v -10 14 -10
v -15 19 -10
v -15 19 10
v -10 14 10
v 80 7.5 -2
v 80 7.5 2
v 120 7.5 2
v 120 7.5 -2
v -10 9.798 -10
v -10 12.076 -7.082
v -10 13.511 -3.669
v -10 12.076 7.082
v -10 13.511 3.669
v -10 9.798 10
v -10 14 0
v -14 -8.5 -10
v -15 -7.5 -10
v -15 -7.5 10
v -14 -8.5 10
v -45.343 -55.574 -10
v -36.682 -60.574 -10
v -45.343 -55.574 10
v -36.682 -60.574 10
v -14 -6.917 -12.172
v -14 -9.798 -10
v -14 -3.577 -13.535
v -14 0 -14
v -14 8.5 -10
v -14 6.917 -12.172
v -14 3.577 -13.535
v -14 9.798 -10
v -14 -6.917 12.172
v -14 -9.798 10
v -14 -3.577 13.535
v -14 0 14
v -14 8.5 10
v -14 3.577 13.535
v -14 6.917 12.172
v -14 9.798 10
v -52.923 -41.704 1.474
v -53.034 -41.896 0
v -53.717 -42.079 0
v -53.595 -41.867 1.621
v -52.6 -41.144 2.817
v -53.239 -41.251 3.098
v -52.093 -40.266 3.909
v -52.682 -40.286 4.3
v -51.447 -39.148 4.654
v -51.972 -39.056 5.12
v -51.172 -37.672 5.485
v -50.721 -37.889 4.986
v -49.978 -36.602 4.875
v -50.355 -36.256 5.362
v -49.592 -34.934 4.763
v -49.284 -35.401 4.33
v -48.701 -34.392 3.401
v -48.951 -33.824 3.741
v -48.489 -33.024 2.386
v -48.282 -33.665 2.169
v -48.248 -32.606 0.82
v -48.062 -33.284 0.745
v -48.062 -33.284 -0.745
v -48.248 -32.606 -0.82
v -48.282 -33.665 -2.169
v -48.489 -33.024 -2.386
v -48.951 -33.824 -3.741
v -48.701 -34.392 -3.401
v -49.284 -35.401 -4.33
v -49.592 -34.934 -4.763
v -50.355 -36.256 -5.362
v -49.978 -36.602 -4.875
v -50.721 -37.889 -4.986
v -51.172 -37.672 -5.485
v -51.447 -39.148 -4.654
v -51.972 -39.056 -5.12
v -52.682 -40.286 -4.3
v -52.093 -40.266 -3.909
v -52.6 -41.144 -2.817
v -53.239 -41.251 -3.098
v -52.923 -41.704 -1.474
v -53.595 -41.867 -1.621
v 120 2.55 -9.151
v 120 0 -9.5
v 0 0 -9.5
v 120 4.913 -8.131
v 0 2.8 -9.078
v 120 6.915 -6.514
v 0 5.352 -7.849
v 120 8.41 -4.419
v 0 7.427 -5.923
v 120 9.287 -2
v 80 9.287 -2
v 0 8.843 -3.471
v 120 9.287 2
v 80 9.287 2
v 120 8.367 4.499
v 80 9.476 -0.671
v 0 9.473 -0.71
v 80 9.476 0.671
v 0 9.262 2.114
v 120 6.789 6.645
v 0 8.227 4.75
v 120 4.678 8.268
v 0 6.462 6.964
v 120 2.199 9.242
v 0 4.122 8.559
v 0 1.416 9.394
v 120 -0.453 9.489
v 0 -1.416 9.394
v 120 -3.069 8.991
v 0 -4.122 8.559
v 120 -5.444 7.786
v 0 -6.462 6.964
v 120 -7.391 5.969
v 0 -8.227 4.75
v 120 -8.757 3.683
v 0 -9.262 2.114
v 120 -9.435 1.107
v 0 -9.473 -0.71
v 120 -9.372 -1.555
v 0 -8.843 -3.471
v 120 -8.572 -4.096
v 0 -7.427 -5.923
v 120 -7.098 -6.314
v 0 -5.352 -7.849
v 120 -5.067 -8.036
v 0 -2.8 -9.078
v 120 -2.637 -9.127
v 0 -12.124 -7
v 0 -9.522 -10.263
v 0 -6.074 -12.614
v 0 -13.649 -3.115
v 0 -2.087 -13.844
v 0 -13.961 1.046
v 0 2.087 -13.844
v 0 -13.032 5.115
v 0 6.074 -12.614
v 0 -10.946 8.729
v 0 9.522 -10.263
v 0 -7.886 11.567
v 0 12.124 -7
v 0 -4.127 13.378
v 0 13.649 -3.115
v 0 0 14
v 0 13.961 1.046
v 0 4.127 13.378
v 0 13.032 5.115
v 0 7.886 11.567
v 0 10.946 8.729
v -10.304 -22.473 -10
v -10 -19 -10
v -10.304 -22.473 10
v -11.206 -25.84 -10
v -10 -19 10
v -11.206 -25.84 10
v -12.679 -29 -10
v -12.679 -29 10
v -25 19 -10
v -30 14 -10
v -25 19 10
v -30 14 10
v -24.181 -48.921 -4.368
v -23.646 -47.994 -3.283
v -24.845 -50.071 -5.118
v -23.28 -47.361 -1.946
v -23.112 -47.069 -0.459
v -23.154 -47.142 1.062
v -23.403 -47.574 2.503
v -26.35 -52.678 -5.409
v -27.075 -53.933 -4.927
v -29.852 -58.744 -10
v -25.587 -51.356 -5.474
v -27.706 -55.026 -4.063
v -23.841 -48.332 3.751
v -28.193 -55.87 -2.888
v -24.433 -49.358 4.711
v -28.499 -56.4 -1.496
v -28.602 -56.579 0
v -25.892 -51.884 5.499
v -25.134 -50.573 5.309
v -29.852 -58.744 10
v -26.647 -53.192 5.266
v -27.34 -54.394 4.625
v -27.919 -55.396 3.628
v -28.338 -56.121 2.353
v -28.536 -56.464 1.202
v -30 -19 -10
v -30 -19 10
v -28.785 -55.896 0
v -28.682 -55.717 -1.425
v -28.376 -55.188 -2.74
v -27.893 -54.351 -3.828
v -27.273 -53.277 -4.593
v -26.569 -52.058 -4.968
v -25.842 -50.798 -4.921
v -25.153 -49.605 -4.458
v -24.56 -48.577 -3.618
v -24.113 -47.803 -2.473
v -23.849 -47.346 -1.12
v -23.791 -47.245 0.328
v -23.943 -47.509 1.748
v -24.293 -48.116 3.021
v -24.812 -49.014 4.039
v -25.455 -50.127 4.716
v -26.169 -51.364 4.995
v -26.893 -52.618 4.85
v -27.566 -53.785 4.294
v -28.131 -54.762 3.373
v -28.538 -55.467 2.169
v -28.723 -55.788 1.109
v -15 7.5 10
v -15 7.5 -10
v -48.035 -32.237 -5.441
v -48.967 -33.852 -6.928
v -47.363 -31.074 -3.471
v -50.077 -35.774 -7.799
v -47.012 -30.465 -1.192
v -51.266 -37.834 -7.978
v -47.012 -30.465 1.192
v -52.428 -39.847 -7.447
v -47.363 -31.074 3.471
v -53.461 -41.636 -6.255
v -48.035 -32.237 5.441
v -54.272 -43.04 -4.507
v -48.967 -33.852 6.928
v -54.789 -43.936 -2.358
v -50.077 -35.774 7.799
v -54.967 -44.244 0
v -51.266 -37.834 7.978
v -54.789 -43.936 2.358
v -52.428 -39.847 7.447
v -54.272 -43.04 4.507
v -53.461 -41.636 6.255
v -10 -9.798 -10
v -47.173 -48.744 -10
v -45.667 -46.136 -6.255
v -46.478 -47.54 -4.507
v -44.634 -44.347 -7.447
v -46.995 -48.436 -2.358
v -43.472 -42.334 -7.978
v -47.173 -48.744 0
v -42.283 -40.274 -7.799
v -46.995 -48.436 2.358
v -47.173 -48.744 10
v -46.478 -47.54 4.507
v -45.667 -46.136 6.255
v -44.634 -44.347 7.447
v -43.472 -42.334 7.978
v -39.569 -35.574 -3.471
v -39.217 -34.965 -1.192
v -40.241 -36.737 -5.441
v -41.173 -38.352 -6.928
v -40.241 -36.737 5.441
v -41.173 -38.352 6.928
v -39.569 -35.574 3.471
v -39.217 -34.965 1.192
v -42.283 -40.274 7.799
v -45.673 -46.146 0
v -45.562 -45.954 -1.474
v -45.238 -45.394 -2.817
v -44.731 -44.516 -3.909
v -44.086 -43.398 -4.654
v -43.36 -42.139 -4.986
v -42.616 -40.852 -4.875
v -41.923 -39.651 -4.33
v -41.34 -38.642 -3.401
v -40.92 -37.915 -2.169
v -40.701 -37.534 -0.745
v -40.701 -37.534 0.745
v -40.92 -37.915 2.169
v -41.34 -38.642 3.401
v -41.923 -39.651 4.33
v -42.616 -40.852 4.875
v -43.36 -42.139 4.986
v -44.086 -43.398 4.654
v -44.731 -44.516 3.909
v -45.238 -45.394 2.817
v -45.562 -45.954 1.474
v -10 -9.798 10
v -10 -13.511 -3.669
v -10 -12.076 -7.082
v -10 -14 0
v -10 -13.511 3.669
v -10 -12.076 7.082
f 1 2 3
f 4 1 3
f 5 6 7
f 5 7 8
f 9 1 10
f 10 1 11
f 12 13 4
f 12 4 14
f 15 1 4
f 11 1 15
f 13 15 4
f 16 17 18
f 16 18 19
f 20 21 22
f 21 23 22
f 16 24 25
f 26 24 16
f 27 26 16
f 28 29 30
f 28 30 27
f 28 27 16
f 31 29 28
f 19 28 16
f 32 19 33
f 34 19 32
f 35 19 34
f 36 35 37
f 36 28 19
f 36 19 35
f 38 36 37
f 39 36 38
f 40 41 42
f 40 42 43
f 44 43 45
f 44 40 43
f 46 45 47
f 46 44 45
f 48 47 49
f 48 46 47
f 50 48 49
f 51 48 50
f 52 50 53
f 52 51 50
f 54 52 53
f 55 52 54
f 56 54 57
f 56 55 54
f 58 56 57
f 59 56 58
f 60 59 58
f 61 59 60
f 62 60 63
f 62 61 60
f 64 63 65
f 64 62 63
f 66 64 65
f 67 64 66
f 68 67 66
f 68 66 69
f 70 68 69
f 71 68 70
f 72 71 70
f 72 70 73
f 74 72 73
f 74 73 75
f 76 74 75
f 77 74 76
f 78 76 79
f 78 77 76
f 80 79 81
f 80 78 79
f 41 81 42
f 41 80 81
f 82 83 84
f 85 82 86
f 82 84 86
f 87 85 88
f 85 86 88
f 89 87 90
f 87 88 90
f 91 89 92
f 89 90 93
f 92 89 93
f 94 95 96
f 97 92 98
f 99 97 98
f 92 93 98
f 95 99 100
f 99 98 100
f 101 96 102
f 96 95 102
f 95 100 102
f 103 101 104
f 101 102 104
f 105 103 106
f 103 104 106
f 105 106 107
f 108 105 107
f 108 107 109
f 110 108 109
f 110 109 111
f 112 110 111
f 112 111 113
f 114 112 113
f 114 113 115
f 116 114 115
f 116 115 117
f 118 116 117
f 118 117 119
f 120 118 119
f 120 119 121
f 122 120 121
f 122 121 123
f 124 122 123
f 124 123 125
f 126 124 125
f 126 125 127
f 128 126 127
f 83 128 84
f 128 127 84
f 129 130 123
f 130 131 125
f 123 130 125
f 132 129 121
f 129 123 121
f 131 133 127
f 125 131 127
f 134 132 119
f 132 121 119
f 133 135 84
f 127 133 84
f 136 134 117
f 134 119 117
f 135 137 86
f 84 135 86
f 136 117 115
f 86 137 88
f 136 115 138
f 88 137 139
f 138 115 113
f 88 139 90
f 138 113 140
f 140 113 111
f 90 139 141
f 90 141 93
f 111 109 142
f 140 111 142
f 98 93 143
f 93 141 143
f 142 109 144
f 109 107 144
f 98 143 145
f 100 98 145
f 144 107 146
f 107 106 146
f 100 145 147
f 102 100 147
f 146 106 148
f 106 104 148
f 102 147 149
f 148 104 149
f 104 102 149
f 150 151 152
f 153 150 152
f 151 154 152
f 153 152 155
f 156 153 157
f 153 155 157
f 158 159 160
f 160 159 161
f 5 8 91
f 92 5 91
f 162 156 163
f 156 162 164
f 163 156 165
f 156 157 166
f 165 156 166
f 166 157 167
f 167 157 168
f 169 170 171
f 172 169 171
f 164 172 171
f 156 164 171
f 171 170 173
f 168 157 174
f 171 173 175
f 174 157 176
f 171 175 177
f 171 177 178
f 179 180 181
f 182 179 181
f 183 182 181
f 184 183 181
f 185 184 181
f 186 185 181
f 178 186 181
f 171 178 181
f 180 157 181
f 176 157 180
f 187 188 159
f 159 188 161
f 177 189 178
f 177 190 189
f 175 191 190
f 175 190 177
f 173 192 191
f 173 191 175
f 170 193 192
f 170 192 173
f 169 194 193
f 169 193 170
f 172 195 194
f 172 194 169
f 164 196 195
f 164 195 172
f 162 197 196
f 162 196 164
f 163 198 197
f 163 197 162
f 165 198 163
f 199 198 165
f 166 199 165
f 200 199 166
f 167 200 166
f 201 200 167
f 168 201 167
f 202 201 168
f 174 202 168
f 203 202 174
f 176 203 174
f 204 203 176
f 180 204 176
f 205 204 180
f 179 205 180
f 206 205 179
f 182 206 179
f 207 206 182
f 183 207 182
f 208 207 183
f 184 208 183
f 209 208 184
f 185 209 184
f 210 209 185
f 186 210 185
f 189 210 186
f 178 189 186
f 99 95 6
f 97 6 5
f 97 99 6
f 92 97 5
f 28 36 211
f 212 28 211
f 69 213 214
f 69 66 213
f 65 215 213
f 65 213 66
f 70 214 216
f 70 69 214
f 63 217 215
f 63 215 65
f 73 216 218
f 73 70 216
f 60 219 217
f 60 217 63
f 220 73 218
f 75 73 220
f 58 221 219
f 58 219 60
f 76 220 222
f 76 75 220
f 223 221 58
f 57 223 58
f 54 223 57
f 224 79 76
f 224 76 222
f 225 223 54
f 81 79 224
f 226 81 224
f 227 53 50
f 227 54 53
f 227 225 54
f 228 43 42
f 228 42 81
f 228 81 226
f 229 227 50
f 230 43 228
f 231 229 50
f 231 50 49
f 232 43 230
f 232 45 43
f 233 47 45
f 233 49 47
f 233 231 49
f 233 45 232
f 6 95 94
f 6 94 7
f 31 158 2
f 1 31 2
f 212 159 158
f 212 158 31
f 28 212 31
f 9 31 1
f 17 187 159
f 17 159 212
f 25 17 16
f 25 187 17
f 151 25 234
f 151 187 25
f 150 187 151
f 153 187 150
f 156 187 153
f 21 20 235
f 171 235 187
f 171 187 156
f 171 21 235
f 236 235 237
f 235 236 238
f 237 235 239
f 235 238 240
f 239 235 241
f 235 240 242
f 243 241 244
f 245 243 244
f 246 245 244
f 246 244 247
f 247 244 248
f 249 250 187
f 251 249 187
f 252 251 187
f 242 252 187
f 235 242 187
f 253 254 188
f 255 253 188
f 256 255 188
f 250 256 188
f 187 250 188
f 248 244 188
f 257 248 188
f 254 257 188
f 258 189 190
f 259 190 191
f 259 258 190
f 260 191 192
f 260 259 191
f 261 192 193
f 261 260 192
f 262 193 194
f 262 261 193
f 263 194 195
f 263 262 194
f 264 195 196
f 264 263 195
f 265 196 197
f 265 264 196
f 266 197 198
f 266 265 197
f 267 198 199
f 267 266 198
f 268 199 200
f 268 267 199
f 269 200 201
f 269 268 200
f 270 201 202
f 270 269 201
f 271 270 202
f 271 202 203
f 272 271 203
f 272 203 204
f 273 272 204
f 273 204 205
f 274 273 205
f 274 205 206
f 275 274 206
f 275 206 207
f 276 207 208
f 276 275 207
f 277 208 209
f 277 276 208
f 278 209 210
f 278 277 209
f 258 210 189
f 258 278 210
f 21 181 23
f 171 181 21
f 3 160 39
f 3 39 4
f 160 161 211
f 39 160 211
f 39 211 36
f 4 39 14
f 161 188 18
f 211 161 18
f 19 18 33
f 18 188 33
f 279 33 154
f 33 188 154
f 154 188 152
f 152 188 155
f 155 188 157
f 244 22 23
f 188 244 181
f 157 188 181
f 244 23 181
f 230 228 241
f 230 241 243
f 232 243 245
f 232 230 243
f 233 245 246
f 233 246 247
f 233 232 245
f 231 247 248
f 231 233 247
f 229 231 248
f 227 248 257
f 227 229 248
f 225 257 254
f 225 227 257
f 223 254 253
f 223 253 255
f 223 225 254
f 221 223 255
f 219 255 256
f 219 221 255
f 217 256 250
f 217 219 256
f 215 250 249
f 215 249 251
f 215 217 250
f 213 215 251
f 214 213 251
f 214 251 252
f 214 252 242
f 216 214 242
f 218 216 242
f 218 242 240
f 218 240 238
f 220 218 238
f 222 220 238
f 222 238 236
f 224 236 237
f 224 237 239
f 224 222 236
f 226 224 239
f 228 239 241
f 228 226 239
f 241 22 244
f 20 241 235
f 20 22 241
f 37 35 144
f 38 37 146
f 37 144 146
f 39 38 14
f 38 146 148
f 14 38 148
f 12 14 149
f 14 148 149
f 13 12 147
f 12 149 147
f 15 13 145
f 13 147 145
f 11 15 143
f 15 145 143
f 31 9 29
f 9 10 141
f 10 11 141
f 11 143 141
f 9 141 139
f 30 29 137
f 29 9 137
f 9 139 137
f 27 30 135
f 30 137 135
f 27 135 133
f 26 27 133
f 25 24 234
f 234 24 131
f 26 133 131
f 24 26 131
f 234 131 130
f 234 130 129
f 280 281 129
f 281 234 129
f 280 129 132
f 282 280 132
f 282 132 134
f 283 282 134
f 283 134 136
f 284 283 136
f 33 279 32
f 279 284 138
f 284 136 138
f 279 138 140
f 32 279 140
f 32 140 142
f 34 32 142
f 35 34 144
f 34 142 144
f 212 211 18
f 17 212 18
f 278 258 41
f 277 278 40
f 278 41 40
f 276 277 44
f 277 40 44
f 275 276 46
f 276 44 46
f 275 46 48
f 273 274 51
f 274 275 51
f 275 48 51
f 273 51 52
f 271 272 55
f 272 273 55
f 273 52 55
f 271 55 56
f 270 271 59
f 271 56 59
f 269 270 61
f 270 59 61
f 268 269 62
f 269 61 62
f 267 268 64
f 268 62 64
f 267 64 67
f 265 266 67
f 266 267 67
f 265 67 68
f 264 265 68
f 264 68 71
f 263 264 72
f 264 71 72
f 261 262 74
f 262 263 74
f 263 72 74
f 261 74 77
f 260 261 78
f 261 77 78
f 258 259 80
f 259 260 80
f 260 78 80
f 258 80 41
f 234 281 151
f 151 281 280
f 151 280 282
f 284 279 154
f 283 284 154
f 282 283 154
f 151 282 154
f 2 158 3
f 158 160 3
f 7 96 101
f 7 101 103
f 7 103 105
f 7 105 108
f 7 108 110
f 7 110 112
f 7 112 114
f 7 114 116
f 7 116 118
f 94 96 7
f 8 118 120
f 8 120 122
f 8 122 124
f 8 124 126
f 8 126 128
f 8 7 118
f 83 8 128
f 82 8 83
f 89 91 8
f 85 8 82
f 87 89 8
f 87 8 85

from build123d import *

# Parameters (mm, degrees)
SCHIZZO1_R                   = 9.5
ESTRUSIONE_ESTRUSIONE1_DEPTH = 120
TAGLIO_ESTRUSIONE1_START     = -40
TAGLIO_ESTRUSIONE1_DEPTH     = 40
SCHIZZO3_R                   = 14
ESTRUSIONE_ESTRUSIONE2_DEPTH = 14
ESTRUSIONE_ESTRUSIONE3_DEPTH = 10
SMUSSO1_SIZE                 = 5
SMUSSO2_SIZE                 = 2
SMUSSO3_SIZE                 = 5
SMUSSO4_SIZE                 = 0.5
ESTRUSIONE_ESTRUSIONE4_START = 9
SCHIZZO7_R                   = 8
SCHIZZO7_R_2                 = 5
ESTRUSIONE_ESTRUSIONE4_DEPTH = 9
SMUSSO5_SIZE                 = 0.5


# Some blends are built 0.0001 mm under size
with BuildPart() as part:
    # Schizzo1 → Estrusione-Estrusione1 (new body)
    with BuildSketch(Plane(origin=(0, 0, 0), x_dir=(0, 0, -1), z_dir=(1, 0, 0))):
        Circle(SCHIZZO1_R)
    extrude(amount=ESTRUSIONE_ESTRUSIONE1_DEPTH)

    # Schizzo2 → Taglio-Estrusione1 (cut)
    with BuildSketch(Plane(origin=(120, 0, 0), x_dir=(0, 0, -1), z_dir=(1, 0, 0)).offset(TAGLIO_ESTRUSIONE1_START)):
        with BuildLine():
            Line((-2, 9.287087811), (-2, 7.5))
            Line((-2, 7.5), (2, 7.5))
            Line((2, 7.5), (2, 9.287087811))
            ThreePointArc((2, 9.287087811), (0, 9.5), (-2, 9.287087811))
        make_face()
    extrude(amount=TAGLIO_ESTRUSIONE1_DEPTH, mode=Mode.SUBTRACT)

    # Schizzo3 → Estrusione-Estrusione2 (add)
    with BuildSketch(Plane.ZY):
        Circle(SCHIZZO3_R)
    extrude(amount=ESTRUSIONE_ESTRUSIONE2_DEPTH)

    # Schizzo4 → Estrusione-Estrusione3 (add, symmetric)
    with BuildSketch(Plane.XY):
        with BuildLine():
            Line((-10, 19), (-10, 9.5))
            Line((-10, 9.5), (-15, 9.5))
            Line((-15, 9.5), (-15, -9.5))
            Line((-15, -9.5), (-10, -9.5))
            Line((-10, -9.5), (-10, -19))
            ThreePointArc((-10, -19), (-10.681483474, -24.176380902), (-12.679491924, -29))
            Line((-12.679491924, -29), (-32.352250588, -63.074217531))
            Line((-32.352250588, -63.074217531), (-49.672758664, -53.074217531))
            Line((-49.672758664, -53.074217531), (-30, -19))
            Line((-30, -19), (-30, 19))
            Line((-30, 19), (-10, 19))
        make_face()
    extrude(amount=ESTRUSIONE_ESTRUSIONE3_DEPTH, both=True)

    # Smusso1
    smusso1_edges = [part.edges().sort_by_distance(p)[0] for p in [
        (-10, 19, 0),
        (-30, 19, 0),
    ]]
    chamfer(smusso1_edges, length=SMUSSO1_SIZE - 0.0001)  # a hair under: the kernel refuses the full size

    # Smusso2
    # the kernel refuses this chamfer: 2 mm, written as the material it adds along each edge
    with BuildSketch(Plane(origin=(-15, 9.5, 10), x_dir=(0.9996219169112968, 0.027495876610586487, 0), z_dir=(0, 0, -1)), Plane(origin=(-15, -9.5, 10), x_dir=(-0.02749587661058651, 0.9996219169112968, 0), z_dir=(0, 0, -1))) as smusso2_piece_1:
        Polygon((SMUSSO2_SIZE * 0.999621916911, SMUSSO2_SIZE * 0.0274958766106), (-SMUSSO2_SIZE * 0.0274958766106, SMUSSO2_SIZE * 0.999621916911), (0, 0), align=None)
    extrude(amount=20)

    # Smusso3
    smusso3_edges = [part.edges().sort_by_distance(p)[0] for p in [
        (-49.672758664, -53.074217531, 0),
        (-32.352250588, -63.074217531, 0),
    ]]
    chamfer(smusso3_edges, length=SMUSSO3_SIZE)

    # Schizzo6 → Taglia-Rivoluzione1 (revolve, cut)
    with BuildSketch(Plane.XY, mode=Mode.PRIVATE) as taglia_rivoluzione1_sk:
        Polygon((-43.172758664, -41.815887282), (-25.852250588, -51.815887282), (-23.352250588, -47.485760263), (-40.672758664, -37.485760263), align=None)
    revolve(taglia_rivoluzione1_sk.sketch.rotate(Axis((-115.6, 0, 0), (0.8660254037844387, -0.5000000000000001, 0)), 180), axis=Axis((-115.6, 0, 0), (0.8660254037844387, -0.5000000000000001, 0)), mode=Mode.SUBTRACT)

    # Smusso4
    smusso4_edges = [part.edges().sort_by_distance(p)[0] for p in [
        (-23.352250588, -47.485760263, 0),
    ]]
    chamfer(smusso4_edges, length=SMUSSO4_SIZE)

    # Schizzo7 → Estrusione-Estrusione4 (add)
    with BuildSketch(Plane(origin=(-14.272758664, 8.240381057, 0), x_dir=(0, 0, 1), z_dir=(-0.8660254037844383, 0.5000000000000009, 0)).offset(ESTRUSIONE_ESTRUSIONE4_START)):
        with Locations(Location((0, -57.8, 0), (0, 0, 270))):
            Circle(SCHIZZO7_R)
        with Locations(Location((0, -57.8, 0), (0, 0, 270))):
            Circle(SCHIZZO7_R_2, mode=Mode.SUBTRACT)
    extrude(amount=-ESTRUSIONE_ESTRUSIONE4_DEPTH)

    # Smusso5
    smusso5_edges = [part.edges().sort_by_distance(p)[0] for p in [
        (-48.466987298, -32.985760263, 0),
    ]]
    chamfer(smusso5_edges, length=SMUSSO5_SIZE)


solid = part.part
